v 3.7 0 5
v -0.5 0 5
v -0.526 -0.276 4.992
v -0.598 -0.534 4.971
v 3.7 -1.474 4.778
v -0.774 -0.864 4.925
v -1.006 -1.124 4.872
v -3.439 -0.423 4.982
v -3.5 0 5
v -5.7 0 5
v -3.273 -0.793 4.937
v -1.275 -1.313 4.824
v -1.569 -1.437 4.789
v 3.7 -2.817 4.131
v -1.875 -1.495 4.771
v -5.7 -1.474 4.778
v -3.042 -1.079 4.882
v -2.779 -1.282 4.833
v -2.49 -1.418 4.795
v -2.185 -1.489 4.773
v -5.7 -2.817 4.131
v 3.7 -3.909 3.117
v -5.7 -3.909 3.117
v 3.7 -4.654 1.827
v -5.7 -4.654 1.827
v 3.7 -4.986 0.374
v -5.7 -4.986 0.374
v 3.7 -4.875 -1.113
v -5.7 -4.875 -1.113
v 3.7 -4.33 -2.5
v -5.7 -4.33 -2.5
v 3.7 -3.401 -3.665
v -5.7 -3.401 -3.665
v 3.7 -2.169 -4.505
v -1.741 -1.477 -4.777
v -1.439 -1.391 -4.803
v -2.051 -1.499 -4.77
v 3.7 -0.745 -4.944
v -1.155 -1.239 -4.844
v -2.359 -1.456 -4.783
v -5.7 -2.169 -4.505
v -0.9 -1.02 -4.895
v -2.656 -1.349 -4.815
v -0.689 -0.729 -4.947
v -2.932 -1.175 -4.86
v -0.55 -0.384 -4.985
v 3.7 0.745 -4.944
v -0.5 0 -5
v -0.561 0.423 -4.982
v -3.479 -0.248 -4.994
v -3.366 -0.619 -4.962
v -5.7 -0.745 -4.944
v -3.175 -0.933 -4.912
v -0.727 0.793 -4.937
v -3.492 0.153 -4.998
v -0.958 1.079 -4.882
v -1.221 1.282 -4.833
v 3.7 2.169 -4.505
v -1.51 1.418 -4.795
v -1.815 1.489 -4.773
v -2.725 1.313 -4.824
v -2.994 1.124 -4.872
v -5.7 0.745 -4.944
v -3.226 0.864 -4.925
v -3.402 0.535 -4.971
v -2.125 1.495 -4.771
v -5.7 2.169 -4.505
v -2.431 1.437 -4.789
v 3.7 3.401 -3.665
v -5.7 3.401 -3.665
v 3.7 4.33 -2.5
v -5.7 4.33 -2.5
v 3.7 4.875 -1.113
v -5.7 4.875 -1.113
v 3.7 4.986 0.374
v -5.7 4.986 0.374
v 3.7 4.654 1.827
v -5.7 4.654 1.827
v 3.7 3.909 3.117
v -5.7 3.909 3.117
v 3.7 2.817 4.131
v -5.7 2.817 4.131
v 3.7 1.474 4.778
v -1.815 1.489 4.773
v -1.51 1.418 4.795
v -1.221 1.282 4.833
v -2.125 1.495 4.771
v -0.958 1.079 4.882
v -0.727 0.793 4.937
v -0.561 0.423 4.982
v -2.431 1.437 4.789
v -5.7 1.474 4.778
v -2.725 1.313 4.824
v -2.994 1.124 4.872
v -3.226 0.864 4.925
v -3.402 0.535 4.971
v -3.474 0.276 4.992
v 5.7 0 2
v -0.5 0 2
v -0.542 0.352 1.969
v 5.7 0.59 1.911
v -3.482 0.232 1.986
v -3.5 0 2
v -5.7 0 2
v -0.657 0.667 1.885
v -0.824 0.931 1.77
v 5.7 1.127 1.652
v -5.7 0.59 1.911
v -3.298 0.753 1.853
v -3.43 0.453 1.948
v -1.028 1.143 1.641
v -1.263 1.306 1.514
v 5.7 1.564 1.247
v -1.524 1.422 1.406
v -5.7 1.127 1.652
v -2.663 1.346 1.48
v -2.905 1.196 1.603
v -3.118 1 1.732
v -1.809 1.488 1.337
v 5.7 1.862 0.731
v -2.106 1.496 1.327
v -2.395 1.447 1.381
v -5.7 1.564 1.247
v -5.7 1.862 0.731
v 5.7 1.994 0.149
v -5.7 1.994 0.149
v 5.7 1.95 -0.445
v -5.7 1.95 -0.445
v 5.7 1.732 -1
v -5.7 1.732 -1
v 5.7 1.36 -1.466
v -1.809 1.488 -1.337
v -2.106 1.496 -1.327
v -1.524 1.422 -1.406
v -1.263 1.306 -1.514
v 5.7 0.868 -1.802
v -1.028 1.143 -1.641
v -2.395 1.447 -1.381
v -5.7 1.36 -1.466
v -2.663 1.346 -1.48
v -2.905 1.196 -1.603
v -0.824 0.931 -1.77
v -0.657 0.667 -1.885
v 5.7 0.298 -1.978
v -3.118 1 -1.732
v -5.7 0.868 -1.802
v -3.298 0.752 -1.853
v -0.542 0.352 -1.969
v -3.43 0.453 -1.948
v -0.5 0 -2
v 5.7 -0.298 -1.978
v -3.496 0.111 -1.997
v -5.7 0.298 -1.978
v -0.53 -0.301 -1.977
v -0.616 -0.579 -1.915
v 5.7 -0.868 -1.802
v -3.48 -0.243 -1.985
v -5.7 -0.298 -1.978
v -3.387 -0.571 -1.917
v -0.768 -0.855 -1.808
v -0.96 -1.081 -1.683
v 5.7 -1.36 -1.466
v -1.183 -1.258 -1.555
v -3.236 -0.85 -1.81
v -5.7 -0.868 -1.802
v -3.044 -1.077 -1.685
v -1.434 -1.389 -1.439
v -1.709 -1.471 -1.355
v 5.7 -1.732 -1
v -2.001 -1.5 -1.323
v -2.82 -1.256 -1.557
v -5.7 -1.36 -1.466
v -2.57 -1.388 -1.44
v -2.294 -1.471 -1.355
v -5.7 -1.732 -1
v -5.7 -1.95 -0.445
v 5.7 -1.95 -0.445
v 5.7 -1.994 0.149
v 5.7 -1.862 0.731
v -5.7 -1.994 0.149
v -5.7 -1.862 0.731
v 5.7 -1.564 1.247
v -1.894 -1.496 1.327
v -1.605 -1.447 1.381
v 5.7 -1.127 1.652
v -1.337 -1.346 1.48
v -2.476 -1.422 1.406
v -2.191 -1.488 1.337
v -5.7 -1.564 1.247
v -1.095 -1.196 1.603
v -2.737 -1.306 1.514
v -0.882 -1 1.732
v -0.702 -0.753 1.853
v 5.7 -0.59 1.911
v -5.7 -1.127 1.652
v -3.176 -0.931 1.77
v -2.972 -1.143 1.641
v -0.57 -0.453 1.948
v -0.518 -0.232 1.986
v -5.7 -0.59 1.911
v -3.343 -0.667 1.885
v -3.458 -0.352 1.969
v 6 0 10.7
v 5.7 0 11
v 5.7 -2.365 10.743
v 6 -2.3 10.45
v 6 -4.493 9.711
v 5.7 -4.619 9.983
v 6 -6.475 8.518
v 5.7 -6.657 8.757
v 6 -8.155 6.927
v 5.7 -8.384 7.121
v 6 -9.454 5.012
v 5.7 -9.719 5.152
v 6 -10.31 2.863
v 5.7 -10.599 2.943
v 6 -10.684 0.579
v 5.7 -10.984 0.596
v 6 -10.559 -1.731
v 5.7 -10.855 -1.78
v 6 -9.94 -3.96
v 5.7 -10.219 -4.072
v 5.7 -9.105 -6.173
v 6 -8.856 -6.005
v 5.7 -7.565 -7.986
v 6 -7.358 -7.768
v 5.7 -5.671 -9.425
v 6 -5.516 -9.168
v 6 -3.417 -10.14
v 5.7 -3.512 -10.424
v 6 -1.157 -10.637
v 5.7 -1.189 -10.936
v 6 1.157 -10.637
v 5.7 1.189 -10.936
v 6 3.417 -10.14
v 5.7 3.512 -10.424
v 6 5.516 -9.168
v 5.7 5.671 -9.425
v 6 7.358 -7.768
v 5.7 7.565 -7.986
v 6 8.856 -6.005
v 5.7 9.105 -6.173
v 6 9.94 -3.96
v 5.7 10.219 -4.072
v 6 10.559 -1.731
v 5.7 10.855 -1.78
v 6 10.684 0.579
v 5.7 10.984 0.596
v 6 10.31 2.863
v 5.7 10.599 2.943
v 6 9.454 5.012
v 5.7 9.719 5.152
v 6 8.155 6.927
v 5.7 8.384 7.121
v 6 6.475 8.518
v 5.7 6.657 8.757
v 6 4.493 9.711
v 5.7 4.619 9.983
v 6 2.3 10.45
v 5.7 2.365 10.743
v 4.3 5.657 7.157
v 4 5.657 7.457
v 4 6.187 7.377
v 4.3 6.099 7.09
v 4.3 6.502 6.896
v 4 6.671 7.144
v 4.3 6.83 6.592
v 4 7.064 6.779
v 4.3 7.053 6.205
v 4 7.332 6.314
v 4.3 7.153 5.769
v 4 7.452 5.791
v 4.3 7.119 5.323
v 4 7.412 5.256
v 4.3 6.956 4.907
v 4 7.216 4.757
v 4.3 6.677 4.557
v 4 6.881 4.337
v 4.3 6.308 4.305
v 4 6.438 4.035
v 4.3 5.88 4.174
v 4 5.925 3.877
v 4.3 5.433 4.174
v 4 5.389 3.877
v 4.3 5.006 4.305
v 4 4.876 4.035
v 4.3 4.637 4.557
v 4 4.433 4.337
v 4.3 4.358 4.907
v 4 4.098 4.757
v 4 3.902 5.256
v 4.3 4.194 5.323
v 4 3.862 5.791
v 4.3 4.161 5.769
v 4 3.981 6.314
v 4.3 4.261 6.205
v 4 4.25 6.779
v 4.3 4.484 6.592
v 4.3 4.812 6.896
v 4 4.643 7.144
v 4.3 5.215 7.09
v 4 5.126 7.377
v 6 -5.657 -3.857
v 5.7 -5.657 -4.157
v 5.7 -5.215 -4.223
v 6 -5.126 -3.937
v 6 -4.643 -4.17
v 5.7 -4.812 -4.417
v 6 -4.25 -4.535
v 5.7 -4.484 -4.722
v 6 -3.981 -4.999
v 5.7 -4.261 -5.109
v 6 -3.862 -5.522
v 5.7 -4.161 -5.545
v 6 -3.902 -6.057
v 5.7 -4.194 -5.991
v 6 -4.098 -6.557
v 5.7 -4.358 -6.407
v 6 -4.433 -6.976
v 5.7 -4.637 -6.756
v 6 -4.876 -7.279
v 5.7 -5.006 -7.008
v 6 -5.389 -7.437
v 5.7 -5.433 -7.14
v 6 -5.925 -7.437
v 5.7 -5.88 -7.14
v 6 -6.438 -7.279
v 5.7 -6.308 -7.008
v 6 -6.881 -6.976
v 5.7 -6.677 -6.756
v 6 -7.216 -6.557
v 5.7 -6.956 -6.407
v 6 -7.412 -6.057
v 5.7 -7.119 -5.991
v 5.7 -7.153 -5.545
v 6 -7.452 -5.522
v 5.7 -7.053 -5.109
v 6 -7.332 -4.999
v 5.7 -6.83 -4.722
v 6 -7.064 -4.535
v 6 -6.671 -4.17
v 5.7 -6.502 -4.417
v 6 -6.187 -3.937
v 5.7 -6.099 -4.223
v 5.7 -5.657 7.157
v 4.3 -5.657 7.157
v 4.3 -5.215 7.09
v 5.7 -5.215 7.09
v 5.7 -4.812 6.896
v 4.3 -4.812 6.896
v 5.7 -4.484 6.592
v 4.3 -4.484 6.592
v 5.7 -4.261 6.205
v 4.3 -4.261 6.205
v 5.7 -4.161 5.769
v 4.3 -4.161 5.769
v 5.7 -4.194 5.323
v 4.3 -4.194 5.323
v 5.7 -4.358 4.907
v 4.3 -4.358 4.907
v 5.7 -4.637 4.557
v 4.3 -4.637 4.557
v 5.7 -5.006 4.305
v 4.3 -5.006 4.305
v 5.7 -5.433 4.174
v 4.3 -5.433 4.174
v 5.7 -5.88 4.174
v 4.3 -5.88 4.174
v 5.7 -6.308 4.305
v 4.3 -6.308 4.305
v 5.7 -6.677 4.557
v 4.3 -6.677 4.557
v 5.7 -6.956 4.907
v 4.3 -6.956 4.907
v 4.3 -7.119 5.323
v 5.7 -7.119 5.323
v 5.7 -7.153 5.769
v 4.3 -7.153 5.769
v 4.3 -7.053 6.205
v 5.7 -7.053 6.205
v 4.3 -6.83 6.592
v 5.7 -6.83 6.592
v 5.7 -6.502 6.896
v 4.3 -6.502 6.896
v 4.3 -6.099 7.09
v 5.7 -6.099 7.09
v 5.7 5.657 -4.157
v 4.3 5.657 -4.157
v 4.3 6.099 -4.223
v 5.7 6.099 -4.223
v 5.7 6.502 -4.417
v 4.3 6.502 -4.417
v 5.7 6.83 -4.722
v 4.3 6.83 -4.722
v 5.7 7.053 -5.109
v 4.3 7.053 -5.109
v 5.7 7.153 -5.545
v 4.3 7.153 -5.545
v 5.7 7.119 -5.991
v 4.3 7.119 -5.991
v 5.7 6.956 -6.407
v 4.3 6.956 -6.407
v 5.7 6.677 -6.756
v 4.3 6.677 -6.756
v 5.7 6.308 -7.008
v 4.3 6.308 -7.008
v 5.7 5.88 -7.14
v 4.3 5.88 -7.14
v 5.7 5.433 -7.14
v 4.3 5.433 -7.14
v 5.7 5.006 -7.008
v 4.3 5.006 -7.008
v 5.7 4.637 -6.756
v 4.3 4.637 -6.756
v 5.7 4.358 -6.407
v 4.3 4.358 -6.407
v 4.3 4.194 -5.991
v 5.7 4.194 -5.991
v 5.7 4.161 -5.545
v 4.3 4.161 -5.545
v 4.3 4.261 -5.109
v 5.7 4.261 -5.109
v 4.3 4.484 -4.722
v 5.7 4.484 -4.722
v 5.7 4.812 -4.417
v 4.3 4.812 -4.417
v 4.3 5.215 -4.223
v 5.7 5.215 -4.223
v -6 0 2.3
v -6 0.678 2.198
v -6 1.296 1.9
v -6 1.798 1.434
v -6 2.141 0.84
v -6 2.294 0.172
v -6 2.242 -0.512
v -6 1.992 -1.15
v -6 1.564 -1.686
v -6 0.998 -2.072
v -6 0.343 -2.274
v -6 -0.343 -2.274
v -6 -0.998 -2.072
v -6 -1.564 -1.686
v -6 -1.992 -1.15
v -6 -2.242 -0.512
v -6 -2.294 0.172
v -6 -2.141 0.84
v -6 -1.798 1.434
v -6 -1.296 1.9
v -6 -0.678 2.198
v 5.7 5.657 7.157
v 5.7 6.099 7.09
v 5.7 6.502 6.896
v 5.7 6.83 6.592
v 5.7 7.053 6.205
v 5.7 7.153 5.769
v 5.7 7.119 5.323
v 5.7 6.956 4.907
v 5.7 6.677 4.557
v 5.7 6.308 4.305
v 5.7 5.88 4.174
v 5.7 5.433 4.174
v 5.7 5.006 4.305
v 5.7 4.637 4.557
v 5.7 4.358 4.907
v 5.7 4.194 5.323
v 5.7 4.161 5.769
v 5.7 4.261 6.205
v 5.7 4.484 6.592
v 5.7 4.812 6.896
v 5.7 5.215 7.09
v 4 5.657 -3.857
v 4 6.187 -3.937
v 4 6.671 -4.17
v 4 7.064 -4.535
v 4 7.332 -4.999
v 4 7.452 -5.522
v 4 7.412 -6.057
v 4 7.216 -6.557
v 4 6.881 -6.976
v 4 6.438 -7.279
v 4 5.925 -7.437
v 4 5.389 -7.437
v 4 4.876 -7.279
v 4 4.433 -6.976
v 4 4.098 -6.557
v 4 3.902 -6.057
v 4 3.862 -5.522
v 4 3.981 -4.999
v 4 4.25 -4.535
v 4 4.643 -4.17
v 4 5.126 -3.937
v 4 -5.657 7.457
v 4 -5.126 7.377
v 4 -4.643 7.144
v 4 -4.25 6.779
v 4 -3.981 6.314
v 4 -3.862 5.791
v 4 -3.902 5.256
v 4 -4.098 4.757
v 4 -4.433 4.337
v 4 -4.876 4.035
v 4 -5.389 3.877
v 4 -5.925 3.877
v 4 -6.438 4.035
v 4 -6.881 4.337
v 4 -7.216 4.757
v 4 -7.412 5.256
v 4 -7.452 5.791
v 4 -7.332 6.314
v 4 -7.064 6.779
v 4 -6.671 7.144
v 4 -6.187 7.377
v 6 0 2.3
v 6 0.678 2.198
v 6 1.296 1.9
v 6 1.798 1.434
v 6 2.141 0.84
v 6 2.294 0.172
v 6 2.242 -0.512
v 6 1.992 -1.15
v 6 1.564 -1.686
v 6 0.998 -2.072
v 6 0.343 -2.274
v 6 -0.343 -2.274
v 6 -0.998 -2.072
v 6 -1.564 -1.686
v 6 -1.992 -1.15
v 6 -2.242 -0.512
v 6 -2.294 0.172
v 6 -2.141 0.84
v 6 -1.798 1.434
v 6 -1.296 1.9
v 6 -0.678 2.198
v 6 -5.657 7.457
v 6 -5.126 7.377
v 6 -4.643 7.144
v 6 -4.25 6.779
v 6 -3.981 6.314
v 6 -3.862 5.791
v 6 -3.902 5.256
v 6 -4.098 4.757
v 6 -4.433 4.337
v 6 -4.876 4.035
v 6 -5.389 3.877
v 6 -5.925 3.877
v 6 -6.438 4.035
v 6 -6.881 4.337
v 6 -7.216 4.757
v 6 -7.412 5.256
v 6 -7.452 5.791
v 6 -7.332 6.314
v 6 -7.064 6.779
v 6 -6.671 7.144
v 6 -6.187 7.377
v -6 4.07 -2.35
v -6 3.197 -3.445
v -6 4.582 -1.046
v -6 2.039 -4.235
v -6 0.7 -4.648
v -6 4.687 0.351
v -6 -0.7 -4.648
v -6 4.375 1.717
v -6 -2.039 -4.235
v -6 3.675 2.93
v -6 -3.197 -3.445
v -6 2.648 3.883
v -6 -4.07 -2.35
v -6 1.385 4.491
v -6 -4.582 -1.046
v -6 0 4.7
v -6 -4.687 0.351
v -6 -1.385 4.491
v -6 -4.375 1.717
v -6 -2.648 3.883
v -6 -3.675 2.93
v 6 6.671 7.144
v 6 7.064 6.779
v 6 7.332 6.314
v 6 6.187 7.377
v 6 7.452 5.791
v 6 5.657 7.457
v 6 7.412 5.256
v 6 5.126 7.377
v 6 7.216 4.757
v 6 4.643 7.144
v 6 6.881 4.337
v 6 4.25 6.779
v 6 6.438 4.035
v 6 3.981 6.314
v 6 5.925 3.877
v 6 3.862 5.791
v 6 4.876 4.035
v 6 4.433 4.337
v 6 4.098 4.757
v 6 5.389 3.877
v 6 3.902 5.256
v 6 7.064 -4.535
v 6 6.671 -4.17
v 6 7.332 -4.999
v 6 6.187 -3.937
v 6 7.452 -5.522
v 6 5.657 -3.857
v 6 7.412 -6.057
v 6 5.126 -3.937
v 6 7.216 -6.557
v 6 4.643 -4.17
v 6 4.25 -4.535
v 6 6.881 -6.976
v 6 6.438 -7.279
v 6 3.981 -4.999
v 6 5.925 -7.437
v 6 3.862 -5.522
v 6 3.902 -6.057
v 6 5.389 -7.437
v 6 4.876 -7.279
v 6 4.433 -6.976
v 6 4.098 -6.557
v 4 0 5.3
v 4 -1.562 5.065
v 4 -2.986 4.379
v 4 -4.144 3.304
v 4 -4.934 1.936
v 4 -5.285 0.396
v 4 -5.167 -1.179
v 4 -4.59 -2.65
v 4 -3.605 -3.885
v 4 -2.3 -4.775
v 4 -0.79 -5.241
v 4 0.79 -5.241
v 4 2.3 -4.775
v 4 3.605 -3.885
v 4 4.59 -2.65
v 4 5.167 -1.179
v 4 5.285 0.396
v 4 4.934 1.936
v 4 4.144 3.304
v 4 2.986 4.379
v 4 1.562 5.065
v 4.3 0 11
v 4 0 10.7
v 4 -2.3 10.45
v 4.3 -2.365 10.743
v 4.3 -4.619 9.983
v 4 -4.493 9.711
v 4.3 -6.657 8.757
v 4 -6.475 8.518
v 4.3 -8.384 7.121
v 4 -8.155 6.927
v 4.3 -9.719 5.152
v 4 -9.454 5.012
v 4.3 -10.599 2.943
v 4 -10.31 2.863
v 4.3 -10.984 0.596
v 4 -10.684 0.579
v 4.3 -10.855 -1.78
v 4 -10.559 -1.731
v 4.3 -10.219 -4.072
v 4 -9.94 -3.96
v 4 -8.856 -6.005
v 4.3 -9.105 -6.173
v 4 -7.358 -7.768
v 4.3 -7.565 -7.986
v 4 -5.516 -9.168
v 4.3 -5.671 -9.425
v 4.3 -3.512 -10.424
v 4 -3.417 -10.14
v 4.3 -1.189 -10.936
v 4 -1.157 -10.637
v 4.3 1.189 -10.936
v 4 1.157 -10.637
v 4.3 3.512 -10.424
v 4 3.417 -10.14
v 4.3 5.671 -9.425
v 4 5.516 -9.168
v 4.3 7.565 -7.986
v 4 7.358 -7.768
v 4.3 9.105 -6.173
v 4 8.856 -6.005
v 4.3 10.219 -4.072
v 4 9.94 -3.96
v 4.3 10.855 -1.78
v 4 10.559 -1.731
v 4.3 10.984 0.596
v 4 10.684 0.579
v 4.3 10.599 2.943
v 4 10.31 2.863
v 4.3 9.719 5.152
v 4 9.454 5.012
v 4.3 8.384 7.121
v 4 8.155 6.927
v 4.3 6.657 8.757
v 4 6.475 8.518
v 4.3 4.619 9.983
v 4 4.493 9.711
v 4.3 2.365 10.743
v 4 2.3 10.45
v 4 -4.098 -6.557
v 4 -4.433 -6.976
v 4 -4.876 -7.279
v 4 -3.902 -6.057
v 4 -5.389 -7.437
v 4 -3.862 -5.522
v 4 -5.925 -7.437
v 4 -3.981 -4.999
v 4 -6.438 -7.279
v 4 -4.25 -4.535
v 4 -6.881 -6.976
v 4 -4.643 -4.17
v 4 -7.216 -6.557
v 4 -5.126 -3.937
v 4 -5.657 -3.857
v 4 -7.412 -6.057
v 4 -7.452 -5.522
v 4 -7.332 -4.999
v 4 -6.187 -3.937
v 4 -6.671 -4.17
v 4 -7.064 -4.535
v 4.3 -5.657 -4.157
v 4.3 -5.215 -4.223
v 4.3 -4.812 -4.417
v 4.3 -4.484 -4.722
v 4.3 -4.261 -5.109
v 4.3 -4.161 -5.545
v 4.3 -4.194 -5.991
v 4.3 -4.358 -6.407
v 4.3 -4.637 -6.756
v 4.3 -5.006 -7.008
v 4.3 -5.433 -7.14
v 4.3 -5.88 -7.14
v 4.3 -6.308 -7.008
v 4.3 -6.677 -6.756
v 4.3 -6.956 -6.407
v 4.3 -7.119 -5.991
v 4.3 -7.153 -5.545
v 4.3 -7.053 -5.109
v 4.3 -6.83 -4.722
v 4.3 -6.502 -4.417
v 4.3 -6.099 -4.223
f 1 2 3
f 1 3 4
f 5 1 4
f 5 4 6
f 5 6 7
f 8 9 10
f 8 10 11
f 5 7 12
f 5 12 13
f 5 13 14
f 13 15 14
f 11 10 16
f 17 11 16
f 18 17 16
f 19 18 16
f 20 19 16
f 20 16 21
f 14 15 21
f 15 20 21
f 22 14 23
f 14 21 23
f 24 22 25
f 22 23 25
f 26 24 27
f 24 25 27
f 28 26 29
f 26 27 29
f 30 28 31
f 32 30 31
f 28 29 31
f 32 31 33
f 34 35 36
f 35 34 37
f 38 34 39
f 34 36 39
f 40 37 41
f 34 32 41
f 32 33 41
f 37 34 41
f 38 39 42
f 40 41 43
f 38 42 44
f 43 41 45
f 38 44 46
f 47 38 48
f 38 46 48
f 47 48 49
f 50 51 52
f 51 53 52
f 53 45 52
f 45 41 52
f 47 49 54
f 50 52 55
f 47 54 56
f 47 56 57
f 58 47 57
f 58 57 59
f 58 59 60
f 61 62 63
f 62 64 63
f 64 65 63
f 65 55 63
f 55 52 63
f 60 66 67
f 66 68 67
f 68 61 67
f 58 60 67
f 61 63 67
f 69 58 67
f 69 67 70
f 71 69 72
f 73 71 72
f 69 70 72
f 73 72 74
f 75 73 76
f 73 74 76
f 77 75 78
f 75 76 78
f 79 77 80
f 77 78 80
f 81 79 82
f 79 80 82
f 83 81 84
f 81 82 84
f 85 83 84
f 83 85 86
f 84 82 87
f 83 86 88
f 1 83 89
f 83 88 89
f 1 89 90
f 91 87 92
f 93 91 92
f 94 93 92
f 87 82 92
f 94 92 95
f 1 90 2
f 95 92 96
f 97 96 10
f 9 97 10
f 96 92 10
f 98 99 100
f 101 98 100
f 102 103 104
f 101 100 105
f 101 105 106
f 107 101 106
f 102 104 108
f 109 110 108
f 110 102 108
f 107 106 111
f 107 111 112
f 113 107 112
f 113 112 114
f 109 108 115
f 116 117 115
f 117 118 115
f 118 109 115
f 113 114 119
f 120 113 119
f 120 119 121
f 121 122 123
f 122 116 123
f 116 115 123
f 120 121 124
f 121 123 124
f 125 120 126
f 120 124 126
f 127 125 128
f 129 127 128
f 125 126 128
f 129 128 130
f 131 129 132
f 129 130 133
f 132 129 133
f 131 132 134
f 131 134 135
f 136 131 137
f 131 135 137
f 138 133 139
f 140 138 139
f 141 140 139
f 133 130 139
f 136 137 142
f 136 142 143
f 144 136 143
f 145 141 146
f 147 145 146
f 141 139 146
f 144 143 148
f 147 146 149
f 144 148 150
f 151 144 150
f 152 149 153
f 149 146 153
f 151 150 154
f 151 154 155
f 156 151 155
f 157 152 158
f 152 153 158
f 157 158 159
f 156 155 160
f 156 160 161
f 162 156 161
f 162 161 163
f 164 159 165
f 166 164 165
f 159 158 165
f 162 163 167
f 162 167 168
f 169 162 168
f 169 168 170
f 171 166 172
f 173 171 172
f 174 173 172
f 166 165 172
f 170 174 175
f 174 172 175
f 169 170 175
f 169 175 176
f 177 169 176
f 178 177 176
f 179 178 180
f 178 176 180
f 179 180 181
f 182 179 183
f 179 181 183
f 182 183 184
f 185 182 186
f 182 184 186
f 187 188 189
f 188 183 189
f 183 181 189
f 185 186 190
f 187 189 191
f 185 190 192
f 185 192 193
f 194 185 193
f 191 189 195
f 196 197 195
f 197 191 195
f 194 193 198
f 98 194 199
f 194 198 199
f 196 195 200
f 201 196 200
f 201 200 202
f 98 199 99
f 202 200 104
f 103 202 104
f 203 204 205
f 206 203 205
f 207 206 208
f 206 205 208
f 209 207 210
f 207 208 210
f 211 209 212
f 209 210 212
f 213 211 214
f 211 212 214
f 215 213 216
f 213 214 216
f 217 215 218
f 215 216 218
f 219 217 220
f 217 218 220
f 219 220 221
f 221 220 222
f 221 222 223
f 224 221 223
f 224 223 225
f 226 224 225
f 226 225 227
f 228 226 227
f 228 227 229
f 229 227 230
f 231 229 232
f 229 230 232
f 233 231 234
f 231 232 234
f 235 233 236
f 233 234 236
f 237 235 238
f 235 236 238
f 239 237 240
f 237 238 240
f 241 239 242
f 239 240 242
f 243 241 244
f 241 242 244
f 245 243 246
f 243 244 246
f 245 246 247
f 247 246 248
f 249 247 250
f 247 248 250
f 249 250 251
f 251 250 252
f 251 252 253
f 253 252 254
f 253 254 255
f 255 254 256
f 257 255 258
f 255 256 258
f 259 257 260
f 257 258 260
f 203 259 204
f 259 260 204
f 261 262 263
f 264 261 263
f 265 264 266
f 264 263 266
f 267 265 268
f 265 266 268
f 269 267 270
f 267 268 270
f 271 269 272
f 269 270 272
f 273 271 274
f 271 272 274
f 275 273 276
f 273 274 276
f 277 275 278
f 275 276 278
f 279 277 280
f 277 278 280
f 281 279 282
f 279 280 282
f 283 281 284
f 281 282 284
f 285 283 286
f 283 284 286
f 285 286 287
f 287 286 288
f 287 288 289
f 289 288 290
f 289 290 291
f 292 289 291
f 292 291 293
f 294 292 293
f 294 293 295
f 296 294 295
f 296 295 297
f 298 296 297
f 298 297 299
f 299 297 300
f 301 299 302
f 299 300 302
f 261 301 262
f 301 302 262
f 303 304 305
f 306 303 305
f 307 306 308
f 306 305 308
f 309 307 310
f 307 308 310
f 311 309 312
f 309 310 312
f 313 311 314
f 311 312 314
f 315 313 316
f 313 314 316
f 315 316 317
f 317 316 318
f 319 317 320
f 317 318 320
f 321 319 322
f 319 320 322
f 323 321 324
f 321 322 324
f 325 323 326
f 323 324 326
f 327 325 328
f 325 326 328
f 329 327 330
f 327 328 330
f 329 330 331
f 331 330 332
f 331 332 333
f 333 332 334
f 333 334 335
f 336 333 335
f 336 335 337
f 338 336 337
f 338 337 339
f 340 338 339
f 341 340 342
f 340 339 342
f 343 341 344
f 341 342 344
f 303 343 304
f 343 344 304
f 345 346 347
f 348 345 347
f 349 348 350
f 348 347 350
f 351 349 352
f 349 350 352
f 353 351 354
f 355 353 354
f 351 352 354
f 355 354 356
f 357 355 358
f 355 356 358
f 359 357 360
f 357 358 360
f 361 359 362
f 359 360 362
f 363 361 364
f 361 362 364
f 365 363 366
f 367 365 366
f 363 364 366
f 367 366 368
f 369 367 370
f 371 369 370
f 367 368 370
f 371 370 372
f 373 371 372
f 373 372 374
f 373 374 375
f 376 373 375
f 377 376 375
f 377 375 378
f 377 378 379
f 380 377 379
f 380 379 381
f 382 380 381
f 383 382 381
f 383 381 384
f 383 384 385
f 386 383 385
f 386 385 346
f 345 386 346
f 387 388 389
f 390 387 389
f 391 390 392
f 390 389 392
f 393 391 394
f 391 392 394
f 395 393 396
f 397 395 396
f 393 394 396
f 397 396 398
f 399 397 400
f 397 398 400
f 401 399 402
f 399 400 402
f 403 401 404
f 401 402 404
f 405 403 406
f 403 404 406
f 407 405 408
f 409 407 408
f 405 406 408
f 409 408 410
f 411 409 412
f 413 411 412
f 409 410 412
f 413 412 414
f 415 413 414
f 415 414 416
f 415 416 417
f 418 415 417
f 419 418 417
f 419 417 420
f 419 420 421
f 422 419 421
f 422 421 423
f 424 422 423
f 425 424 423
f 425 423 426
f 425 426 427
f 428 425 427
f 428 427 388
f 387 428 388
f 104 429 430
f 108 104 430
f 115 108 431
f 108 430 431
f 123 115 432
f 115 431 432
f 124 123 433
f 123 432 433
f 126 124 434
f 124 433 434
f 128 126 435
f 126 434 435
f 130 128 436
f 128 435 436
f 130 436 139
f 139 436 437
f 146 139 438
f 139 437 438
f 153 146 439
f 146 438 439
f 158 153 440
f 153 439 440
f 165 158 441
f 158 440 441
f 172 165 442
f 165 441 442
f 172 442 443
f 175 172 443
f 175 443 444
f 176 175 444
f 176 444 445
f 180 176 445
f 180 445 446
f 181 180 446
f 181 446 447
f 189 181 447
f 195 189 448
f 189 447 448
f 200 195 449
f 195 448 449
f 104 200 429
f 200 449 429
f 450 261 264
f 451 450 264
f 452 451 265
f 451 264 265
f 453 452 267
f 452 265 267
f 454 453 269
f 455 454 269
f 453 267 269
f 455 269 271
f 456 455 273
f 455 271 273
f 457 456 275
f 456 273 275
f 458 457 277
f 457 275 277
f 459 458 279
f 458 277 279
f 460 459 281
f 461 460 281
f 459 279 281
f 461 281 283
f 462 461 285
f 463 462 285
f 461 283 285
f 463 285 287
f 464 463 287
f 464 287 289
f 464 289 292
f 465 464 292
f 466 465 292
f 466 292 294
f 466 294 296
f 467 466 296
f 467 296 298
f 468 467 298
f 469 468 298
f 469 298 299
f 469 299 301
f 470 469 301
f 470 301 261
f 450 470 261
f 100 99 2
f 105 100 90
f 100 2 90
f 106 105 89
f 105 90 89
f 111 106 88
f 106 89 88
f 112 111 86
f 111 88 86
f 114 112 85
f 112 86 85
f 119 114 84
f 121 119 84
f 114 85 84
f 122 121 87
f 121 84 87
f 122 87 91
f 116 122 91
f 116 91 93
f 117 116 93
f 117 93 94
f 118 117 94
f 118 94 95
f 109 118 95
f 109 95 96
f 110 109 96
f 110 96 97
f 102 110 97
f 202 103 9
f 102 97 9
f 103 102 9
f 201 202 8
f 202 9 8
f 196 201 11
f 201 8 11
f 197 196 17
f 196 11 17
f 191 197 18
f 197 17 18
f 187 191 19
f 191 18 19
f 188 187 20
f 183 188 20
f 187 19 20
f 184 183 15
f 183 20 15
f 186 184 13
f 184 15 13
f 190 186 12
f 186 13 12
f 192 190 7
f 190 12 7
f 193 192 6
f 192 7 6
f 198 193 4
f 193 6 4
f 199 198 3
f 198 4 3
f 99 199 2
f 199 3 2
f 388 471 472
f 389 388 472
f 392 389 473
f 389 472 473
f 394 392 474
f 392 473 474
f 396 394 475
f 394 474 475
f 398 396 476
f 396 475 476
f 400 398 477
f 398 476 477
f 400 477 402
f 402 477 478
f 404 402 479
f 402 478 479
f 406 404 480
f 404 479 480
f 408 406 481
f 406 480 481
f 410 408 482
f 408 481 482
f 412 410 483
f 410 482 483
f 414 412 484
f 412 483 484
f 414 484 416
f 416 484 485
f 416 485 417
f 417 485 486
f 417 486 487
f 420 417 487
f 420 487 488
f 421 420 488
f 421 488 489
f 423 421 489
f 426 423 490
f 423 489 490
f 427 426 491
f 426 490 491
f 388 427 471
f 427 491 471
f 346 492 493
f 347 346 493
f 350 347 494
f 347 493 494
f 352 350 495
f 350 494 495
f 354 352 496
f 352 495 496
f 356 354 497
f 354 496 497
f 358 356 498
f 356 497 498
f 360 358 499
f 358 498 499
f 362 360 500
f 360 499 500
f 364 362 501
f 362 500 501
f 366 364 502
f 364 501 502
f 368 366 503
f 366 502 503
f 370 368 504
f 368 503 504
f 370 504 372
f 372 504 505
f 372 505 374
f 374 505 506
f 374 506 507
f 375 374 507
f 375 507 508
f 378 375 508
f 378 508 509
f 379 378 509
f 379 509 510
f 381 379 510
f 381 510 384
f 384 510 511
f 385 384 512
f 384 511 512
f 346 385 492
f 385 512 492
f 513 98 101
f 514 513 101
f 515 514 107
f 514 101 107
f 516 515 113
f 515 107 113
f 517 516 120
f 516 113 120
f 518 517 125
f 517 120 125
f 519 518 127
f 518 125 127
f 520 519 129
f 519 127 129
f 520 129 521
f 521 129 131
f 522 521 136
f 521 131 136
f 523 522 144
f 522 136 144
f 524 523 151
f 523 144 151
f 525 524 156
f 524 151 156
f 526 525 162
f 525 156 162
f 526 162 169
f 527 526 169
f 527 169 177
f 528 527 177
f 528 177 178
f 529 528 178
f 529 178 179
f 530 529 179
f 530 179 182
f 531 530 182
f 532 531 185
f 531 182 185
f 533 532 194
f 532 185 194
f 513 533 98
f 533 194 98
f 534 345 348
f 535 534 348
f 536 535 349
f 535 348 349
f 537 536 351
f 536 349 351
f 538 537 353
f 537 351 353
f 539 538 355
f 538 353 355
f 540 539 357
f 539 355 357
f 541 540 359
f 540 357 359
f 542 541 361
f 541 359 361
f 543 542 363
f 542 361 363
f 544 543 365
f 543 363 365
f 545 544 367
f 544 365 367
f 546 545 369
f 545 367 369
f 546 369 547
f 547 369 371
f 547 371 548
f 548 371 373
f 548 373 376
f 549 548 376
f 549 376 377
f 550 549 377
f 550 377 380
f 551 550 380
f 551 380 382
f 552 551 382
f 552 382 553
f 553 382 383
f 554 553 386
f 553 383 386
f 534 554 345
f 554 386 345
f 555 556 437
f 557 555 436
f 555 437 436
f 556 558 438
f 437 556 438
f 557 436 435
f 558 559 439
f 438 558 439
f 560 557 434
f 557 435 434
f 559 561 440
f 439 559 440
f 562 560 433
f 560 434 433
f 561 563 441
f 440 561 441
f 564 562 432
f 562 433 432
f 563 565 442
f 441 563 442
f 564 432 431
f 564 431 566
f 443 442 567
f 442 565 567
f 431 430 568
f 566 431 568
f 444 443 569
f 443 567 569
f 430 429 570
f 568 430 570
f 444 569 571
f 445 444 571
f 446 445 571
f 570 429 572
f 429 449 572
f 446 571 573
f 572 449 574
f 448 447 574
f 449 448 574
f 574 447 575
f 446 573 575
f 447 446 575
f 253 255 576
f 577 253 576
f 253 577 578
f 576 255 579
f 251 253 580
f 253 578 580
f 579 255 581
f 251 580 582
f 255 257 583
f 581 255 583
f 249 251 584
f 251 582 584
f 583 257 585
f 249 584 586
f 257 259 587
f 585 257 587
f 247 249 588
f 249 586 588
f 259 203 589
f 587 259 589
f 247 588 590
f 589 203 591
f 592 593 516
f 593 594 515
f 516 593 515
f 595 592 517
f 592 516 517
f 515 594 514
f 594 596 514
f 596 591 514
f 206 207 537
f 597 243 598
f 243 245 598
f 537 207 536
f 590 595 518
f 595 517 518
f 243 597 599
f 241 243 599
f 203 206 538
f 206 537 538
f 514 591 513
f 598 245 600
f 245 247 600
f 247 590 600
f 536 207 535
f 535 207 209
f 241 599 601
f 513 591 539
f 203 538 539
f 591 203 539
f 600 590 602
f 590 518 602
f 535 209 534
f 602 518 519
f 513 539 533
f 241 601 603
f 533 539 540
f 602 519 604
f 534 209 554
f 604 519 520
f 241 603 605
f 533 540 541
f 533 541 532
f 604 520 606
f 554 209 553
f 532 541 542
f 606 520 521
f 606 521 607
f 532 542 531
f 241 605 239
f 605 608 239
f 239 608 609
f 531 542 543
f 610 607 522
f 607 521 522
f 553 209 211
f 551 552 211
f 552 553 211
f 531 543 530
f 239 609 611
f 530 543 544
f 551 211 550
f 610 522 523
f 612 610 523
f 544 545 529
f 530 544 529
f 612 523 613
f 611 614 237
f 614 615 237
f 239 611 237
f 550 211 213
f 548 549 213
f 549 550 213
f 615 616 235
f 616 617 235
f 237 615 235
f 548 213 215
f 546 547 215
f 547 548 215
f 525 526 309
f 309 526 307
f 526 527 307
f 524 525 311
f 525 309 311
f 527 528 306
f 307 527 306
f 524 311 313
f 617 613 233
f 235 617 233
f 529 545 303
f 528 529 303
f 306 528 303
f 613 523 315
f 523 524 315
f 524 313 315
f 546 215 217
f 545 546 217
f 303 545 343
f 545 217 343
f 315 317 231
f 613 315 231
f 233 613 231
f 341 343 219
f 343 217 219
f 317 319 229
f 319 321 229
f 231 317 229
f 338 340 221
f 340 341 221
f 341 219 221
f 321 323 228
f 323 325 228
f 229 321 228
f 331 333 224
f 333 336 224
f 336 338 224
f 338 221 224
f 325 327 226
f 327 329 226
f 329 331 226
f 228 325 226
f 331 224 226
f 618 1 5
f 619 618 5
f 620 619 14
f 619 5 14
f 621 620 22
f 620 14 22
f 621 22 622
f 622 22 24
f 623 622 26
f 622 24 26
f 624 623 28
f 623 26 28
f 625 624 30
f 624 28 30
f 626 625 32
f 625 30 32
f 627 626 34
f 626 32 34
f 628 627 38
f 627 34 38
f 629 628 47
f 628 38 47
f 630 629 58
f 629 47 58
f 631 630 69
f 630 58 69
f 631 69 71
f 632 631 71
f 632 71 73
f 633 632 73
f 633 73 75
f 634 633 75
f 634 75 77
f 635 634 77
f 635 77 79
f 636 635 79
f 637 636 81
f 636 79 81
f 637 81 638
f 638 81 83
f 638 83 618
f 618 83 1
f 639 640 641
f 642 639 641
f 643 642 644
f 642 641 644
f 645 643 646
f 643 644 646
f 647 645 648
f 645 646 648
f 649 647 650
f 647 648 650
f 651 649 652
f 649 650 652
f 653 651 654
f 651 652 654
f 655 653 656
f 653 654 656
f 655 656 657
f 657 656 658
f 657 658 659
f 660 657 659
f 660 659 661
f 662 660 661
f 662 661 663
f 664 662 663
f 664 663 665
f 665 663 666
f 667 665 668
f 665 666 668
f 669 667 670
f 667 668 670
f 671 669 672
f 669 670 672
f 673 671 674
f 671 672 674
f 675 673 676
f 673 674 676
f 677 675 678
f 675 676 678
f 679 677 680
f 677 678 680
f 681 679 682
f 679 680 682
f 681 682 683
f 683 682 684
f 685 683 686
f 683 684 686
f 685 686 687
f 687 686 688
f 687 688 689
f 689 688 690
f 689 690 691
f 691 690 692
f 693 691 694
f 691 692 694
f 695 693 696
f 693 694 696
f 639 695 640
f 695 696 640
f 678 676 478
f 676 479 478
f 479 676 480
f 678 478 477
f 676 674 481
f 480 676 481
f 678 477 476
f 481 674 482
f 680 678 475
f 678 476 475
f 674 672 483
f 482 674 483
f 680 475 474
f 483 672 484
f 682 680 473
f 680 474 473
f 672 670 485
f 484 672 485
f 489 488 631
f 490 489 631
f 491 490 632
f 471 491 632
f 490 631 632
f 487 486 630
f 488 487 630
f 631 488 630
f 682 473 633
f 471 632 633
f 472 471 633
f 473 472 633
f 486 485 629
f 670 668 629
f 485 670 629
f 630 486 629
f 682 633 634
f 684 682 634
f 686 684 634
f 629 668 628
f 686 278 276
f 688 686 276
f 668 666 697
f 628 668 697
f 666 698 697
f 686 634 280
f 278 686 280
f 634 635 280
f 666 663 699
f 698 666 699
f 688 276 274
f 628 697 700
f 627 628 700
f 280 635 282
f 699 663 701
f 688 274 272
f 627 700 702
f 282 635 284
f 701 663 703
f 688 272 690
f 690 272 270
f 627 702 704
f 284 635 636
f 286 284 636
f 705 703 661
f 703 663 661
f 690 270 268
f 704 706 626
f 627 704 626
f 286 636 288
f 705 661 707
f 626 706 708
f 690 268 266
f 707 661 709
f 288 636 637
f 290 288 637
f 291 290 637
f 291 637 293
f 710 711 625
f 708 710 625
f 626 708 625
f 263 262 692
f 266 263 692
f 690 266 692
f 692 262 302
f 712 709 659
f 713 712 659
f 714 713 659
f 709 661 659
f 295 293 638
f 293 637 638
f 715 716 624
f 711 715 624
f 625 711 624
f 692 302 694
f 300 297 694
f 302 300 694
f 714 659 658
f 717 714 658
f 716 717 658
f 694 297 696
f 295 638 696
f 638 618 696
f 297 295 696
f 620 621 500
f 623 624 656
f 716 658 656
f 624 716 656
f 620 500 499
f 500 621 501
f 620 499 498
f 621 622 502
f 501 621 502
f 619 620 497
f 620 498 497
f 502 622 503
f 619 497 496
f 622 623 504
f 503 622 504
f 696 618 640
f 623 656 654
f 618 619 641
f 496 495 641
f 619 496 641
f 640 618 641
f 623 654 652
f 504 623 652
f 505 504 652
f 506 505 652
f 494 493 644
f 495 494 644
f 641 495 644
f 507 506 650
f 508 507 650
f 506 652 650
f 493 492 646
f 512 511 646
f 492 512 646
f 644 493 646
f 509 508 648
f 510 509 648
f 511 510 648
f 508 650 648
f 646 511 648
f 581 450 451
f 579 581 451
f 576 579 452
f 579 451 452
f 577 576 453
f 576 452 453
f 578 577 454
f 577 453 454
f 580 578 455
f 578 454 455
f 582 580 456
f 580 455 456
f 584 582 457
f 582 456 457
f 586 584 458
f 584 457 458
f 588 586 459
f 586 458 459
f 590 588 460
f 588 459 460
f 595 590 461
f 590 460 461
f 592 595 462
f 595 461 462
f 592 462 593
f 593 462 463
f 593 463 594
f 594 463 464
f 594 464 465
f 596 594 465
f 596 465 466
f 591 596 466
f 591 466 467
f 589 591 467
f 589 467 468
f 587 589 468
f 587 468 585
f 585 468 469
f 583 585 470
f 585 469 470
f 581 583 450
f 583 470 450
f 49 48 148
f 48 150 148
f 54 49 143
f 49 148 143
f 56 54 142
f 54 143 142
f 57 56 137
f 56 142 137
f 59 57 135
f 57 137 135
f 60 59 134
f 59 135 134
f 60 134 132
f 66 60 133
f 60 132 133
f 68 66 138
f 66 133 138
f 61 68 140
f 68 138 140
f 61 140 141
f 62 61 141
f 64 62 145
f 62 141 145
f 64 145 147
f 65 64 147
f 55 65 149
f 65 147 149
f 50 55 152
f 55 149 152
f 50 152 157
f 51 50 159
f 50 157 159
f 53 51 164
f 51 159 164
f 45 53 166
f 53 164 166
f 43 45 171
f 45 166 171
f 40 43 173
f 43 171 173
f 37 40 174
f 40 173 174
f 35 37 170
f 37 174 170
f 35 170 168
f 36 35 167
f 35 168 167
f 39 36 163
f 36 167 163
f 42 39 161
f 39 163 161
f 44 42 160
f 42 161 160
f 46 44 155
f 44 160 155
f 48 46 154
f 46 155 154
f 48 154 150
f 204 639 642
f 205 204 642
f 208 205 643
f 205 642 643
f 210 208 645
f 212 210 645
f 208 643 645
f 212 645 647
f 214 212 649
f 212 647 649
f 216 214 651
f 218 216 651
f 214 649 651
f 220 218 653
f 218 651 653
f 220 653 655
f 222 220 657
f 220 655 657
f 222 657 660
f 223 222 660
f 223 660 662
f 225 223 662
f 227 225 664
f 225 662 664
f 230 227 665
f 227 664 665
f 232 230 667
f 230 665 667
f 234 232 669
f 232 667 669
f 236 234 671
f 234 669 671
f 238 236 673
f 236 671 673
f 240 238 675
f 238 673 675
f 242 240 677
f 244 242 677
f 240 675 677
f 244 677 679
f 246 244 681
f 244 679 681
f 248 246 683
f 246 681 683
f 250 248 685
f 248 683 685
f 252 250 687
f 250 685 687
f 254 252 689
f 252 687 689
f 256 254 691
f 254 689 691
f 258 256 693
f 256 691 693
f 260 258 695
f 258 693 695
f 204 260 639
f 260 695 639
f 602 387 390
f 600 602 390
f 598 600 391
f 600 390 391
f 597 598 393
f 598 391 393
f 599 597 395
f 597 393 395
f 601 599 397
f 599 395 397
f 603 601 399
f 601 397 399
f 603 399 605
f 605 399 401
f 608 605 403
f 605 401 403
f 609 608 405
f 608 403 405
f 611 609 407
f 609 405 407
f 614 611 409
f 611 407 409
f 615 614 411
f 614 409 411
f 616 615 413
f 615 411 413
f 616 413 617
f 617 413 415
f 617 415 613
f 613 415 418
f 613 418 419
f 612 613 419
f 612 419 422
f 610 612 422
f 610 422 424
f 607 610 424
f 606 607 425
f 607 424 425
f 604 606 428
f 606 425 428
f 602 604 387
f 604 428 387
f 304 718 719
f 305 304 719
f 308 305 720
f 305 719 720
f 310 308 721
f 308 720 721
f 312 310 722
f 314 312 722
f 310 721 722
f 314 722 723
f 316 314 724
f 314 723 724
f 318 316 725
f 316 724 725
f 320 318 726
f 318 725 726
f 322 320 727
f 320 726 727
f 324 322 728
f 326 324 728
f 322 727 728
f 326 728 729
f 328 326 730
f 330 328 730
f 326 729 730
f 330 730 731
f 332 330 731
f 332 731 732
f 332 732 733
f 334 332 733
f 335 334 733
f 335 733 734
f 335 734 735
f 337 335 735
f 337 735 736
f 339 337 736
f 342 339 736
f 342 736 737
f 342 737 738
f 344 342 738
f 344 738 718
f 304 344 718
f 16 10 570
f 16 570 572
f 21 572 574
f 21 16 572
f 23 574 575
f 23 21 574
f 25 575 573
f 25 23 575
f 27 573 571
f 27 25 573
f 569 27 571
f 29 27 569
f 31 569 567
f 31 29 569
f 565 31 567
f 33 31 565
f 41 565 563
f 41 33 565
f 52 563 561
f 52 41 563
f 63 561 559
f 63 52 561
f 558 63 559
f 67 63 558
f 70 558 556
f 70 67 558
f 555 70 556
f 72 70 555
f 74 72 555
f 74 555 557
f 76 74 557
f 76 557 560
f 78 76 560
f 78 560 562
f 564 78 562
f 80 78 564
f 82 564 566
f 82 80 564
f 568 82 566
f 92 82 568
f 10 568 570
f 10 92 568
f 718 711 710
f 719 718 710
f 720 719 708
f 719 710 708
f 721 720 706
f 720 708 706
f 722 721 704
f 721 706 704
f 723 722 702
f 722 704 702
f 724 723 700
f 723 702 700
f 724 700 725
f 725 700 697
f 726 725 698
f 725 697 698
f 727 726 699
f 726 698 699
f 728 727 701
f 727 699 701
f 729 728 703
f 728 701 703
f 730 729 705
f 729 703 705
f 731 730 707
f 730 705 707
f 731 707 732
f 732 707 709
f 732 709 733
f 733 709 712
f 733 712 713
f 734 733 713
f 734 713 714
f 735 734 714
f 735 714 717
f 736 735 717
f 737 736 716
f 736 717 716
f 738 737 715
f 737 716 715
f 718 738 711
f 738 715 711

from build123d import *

# Parameters (mm, degrees)
SKETCH2_R          = 2
SKETCH2_R_2        = 1.5
CUT_EXTRUDE1_DEPTH = 12
CHAMFER1_SIZE      = 0.3
SKETCH3_R          = 1.5
CUT_EXTRUDE2_DEPTH = 6


with BuildPart() as part:
    # Sketch1 → Revolve1 (revolve)
    with BuildSketch(Plane.XY, mode=Mode.PRIVATE) as revolve1_sk:
        Polygon((-6, 0), (6, 0), (6, 11), (4, 11), (4, 5), (-6, 5), align=None)
    revolve(revolve1_sk.sketch.rotate(Axis((-6, 0, 0), (1, 0, 0)), 90), axis=Axis((-6, 0, 0), (1, 0, 0)))

    # Sketch2 → Cut-Extrude1 (cut)
    with BuildSketch(Plane.ZY.offset(6)):
        Circle(SKETCH2_R)
        with Locations((-5.656854249, 5.656854249)):
            Circle(SKETCH2_R_2)
        with Locations((5.656854249, 5.656854249)):
            Circle(SKETCH2_R_2)
        with Locations((5.656854249, -5.656854249)):
            Circle(SKETCH2_R_2)
        with Locations((-5.656854249, -5.656854249)):
            Circle(SKETCH2_R_2)
    extrude(amount=-CUT_EXTRUDE1_DEPTH, mode=Mode.SUBTRACT)

    # Chamfer1
    chamfer1_edges = [part.edges().sort_by_distance(p)[0] for p in [
        (6, -5.656854249, -7.156854249),
        (4, -5.656854249, -7.156854249),
        (6, -5.656854249, 4.156854249),
        (4, -5.656854249, 4.156854249),
        (6, 5.656854249, 4.156854249),
        (4, 5.656854249, 4.156854249),
        (6, 5.656854249, -7.156854249),
        (4, 5.656854249, -7.156854249),
        (6, 0, -2),
        (-6, 0, -2),
        (4, 0, -5),
        (4, 0, -11),
        (6, 0, -11),
        (-6, 0, -5),
    ]]
    chamfer(chamfer1_edges, length=CHAMFER1_SIZE)

    # Sketch3 → Cut-Extrude2 (cut, symmetric)
    with BuildSketch(Plane.XY):
        with Locations((-2, 0)):
            Circle(SKETCH3_R)
    extrude(amount=CUT_EXTRUDE2_DEPTH, both=True, mode=Mode.SUBTRACT)


solid = part.part
